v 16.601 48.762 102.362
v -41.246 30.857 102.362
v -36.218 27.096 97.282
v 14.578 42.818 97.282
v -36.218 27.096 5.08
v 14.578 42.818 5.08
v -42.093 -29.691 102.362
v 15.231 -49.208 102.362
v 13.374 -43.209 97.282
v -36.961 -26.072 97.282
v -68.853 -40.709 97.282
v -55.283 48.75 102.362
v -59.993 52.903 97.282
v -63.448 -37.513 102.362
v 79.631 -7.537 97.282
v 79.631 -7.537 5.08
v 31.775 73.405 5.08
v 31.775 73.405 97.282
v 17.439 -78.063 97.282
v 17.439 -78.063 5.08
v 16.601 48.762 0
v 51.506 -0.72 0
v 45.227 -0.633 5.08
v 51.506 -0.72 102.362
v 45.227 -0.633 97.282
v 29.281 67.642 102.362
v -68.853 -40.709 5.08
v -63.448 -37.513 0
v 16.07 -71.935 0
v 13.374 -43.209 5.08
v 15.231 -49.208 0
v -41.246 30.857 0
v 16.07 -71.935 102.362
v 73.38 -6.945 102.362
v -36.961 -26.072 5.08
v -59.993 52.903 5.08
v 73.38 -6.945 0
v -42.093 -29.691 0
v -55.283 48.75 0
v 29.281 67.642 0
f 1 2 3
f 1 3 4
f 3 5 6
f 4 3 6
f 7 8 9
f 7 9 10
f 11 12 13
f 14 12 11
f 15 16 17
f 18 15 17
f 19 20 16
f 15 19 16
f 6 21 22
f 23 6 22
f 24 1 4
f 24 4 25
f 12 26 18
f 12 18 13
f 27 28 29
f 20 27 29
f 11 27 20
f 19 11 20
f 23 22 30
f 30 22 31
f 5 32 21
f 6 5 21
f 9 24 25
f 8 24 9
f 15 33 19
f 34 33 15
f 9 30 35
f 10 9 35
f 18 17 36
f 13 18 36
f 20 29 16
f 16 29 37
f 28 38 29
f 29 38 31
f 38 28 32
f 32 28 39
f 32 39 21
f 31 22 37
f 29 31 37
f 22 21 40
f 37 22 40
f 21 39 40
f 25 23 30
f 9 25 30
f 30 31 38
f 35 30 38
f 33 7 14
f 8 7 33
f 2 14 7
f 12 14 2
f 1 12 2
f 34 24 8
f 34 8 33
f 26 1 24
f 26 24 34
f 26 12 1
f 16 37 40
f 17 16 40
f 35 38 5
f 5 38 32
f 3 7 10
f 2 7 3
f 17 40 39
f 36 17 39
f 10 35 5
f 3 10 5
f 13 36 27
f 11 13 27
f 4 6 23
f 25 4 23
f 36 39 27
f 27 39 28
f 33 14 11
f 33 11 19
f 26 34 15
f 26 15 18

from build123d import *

# Parameters (mm, degrees)
F1_DEPTH = 102.362
F2_SIZE  = 5.08


with BuildPart() as f1:
    # F0 (on Top) → F1 (new body)
    with BuildSketch(Plane.XY):
        Polygon((17.439397, -78.062701), (79.63111, -7.536849), (31.775335, 73.404672), (-59.992873, 52.903431), (-68.85297, -40.708554), align=None)
        Polygon((14.577651, 42.818111), (45.227185, -0.632646), (13.374287, -43.209108), (-36.961421, -26.072052), (-36.217702, 27.095694), align=None, mode=Mode.SUBTRACT)
    extrude(amount=F1_DEPTH)

    # F2
    f2_edges = [f1.edges().sort_by_distance(p)[0] for p in [
        (48.535254, -42.799775, 0),
        (55.703223, 32.933912, 0),
        (-14.108769, 63.154051, 0),
        (-64.422921, 6.097439, 0),
        (-25.706786, -59.385627, 0),
        (-10.820026, 34.956902, 0),
        (29.902418, 21.092733, 0),
        (29.300736, -21.920877, 0),
        (-11.793567, -34.64058, 0),
        (-36.589562, 0.511821, 0),
        (48.535254, -42.799775, 102.362),
        (55.703223, 32.933912, 102.362),
        (-14.108769, 63.154051, 102.362),
        (-64.422921, 6.097439, 102.362),
        (-25.706786, -59.385627, 102.362),
        (-10.820026, 34.956902, 102.362),
        (29.902418, 21.092733, 102.362),
        (29.300736, -21.920877, 102.362),
        (-11.793567, -34.64058, 102.362),
        (-36.589562, 0.511821, 102.362),
    ]]
    chamfer(f2_edges, length=F2_SIZE)


solid = f1.part
